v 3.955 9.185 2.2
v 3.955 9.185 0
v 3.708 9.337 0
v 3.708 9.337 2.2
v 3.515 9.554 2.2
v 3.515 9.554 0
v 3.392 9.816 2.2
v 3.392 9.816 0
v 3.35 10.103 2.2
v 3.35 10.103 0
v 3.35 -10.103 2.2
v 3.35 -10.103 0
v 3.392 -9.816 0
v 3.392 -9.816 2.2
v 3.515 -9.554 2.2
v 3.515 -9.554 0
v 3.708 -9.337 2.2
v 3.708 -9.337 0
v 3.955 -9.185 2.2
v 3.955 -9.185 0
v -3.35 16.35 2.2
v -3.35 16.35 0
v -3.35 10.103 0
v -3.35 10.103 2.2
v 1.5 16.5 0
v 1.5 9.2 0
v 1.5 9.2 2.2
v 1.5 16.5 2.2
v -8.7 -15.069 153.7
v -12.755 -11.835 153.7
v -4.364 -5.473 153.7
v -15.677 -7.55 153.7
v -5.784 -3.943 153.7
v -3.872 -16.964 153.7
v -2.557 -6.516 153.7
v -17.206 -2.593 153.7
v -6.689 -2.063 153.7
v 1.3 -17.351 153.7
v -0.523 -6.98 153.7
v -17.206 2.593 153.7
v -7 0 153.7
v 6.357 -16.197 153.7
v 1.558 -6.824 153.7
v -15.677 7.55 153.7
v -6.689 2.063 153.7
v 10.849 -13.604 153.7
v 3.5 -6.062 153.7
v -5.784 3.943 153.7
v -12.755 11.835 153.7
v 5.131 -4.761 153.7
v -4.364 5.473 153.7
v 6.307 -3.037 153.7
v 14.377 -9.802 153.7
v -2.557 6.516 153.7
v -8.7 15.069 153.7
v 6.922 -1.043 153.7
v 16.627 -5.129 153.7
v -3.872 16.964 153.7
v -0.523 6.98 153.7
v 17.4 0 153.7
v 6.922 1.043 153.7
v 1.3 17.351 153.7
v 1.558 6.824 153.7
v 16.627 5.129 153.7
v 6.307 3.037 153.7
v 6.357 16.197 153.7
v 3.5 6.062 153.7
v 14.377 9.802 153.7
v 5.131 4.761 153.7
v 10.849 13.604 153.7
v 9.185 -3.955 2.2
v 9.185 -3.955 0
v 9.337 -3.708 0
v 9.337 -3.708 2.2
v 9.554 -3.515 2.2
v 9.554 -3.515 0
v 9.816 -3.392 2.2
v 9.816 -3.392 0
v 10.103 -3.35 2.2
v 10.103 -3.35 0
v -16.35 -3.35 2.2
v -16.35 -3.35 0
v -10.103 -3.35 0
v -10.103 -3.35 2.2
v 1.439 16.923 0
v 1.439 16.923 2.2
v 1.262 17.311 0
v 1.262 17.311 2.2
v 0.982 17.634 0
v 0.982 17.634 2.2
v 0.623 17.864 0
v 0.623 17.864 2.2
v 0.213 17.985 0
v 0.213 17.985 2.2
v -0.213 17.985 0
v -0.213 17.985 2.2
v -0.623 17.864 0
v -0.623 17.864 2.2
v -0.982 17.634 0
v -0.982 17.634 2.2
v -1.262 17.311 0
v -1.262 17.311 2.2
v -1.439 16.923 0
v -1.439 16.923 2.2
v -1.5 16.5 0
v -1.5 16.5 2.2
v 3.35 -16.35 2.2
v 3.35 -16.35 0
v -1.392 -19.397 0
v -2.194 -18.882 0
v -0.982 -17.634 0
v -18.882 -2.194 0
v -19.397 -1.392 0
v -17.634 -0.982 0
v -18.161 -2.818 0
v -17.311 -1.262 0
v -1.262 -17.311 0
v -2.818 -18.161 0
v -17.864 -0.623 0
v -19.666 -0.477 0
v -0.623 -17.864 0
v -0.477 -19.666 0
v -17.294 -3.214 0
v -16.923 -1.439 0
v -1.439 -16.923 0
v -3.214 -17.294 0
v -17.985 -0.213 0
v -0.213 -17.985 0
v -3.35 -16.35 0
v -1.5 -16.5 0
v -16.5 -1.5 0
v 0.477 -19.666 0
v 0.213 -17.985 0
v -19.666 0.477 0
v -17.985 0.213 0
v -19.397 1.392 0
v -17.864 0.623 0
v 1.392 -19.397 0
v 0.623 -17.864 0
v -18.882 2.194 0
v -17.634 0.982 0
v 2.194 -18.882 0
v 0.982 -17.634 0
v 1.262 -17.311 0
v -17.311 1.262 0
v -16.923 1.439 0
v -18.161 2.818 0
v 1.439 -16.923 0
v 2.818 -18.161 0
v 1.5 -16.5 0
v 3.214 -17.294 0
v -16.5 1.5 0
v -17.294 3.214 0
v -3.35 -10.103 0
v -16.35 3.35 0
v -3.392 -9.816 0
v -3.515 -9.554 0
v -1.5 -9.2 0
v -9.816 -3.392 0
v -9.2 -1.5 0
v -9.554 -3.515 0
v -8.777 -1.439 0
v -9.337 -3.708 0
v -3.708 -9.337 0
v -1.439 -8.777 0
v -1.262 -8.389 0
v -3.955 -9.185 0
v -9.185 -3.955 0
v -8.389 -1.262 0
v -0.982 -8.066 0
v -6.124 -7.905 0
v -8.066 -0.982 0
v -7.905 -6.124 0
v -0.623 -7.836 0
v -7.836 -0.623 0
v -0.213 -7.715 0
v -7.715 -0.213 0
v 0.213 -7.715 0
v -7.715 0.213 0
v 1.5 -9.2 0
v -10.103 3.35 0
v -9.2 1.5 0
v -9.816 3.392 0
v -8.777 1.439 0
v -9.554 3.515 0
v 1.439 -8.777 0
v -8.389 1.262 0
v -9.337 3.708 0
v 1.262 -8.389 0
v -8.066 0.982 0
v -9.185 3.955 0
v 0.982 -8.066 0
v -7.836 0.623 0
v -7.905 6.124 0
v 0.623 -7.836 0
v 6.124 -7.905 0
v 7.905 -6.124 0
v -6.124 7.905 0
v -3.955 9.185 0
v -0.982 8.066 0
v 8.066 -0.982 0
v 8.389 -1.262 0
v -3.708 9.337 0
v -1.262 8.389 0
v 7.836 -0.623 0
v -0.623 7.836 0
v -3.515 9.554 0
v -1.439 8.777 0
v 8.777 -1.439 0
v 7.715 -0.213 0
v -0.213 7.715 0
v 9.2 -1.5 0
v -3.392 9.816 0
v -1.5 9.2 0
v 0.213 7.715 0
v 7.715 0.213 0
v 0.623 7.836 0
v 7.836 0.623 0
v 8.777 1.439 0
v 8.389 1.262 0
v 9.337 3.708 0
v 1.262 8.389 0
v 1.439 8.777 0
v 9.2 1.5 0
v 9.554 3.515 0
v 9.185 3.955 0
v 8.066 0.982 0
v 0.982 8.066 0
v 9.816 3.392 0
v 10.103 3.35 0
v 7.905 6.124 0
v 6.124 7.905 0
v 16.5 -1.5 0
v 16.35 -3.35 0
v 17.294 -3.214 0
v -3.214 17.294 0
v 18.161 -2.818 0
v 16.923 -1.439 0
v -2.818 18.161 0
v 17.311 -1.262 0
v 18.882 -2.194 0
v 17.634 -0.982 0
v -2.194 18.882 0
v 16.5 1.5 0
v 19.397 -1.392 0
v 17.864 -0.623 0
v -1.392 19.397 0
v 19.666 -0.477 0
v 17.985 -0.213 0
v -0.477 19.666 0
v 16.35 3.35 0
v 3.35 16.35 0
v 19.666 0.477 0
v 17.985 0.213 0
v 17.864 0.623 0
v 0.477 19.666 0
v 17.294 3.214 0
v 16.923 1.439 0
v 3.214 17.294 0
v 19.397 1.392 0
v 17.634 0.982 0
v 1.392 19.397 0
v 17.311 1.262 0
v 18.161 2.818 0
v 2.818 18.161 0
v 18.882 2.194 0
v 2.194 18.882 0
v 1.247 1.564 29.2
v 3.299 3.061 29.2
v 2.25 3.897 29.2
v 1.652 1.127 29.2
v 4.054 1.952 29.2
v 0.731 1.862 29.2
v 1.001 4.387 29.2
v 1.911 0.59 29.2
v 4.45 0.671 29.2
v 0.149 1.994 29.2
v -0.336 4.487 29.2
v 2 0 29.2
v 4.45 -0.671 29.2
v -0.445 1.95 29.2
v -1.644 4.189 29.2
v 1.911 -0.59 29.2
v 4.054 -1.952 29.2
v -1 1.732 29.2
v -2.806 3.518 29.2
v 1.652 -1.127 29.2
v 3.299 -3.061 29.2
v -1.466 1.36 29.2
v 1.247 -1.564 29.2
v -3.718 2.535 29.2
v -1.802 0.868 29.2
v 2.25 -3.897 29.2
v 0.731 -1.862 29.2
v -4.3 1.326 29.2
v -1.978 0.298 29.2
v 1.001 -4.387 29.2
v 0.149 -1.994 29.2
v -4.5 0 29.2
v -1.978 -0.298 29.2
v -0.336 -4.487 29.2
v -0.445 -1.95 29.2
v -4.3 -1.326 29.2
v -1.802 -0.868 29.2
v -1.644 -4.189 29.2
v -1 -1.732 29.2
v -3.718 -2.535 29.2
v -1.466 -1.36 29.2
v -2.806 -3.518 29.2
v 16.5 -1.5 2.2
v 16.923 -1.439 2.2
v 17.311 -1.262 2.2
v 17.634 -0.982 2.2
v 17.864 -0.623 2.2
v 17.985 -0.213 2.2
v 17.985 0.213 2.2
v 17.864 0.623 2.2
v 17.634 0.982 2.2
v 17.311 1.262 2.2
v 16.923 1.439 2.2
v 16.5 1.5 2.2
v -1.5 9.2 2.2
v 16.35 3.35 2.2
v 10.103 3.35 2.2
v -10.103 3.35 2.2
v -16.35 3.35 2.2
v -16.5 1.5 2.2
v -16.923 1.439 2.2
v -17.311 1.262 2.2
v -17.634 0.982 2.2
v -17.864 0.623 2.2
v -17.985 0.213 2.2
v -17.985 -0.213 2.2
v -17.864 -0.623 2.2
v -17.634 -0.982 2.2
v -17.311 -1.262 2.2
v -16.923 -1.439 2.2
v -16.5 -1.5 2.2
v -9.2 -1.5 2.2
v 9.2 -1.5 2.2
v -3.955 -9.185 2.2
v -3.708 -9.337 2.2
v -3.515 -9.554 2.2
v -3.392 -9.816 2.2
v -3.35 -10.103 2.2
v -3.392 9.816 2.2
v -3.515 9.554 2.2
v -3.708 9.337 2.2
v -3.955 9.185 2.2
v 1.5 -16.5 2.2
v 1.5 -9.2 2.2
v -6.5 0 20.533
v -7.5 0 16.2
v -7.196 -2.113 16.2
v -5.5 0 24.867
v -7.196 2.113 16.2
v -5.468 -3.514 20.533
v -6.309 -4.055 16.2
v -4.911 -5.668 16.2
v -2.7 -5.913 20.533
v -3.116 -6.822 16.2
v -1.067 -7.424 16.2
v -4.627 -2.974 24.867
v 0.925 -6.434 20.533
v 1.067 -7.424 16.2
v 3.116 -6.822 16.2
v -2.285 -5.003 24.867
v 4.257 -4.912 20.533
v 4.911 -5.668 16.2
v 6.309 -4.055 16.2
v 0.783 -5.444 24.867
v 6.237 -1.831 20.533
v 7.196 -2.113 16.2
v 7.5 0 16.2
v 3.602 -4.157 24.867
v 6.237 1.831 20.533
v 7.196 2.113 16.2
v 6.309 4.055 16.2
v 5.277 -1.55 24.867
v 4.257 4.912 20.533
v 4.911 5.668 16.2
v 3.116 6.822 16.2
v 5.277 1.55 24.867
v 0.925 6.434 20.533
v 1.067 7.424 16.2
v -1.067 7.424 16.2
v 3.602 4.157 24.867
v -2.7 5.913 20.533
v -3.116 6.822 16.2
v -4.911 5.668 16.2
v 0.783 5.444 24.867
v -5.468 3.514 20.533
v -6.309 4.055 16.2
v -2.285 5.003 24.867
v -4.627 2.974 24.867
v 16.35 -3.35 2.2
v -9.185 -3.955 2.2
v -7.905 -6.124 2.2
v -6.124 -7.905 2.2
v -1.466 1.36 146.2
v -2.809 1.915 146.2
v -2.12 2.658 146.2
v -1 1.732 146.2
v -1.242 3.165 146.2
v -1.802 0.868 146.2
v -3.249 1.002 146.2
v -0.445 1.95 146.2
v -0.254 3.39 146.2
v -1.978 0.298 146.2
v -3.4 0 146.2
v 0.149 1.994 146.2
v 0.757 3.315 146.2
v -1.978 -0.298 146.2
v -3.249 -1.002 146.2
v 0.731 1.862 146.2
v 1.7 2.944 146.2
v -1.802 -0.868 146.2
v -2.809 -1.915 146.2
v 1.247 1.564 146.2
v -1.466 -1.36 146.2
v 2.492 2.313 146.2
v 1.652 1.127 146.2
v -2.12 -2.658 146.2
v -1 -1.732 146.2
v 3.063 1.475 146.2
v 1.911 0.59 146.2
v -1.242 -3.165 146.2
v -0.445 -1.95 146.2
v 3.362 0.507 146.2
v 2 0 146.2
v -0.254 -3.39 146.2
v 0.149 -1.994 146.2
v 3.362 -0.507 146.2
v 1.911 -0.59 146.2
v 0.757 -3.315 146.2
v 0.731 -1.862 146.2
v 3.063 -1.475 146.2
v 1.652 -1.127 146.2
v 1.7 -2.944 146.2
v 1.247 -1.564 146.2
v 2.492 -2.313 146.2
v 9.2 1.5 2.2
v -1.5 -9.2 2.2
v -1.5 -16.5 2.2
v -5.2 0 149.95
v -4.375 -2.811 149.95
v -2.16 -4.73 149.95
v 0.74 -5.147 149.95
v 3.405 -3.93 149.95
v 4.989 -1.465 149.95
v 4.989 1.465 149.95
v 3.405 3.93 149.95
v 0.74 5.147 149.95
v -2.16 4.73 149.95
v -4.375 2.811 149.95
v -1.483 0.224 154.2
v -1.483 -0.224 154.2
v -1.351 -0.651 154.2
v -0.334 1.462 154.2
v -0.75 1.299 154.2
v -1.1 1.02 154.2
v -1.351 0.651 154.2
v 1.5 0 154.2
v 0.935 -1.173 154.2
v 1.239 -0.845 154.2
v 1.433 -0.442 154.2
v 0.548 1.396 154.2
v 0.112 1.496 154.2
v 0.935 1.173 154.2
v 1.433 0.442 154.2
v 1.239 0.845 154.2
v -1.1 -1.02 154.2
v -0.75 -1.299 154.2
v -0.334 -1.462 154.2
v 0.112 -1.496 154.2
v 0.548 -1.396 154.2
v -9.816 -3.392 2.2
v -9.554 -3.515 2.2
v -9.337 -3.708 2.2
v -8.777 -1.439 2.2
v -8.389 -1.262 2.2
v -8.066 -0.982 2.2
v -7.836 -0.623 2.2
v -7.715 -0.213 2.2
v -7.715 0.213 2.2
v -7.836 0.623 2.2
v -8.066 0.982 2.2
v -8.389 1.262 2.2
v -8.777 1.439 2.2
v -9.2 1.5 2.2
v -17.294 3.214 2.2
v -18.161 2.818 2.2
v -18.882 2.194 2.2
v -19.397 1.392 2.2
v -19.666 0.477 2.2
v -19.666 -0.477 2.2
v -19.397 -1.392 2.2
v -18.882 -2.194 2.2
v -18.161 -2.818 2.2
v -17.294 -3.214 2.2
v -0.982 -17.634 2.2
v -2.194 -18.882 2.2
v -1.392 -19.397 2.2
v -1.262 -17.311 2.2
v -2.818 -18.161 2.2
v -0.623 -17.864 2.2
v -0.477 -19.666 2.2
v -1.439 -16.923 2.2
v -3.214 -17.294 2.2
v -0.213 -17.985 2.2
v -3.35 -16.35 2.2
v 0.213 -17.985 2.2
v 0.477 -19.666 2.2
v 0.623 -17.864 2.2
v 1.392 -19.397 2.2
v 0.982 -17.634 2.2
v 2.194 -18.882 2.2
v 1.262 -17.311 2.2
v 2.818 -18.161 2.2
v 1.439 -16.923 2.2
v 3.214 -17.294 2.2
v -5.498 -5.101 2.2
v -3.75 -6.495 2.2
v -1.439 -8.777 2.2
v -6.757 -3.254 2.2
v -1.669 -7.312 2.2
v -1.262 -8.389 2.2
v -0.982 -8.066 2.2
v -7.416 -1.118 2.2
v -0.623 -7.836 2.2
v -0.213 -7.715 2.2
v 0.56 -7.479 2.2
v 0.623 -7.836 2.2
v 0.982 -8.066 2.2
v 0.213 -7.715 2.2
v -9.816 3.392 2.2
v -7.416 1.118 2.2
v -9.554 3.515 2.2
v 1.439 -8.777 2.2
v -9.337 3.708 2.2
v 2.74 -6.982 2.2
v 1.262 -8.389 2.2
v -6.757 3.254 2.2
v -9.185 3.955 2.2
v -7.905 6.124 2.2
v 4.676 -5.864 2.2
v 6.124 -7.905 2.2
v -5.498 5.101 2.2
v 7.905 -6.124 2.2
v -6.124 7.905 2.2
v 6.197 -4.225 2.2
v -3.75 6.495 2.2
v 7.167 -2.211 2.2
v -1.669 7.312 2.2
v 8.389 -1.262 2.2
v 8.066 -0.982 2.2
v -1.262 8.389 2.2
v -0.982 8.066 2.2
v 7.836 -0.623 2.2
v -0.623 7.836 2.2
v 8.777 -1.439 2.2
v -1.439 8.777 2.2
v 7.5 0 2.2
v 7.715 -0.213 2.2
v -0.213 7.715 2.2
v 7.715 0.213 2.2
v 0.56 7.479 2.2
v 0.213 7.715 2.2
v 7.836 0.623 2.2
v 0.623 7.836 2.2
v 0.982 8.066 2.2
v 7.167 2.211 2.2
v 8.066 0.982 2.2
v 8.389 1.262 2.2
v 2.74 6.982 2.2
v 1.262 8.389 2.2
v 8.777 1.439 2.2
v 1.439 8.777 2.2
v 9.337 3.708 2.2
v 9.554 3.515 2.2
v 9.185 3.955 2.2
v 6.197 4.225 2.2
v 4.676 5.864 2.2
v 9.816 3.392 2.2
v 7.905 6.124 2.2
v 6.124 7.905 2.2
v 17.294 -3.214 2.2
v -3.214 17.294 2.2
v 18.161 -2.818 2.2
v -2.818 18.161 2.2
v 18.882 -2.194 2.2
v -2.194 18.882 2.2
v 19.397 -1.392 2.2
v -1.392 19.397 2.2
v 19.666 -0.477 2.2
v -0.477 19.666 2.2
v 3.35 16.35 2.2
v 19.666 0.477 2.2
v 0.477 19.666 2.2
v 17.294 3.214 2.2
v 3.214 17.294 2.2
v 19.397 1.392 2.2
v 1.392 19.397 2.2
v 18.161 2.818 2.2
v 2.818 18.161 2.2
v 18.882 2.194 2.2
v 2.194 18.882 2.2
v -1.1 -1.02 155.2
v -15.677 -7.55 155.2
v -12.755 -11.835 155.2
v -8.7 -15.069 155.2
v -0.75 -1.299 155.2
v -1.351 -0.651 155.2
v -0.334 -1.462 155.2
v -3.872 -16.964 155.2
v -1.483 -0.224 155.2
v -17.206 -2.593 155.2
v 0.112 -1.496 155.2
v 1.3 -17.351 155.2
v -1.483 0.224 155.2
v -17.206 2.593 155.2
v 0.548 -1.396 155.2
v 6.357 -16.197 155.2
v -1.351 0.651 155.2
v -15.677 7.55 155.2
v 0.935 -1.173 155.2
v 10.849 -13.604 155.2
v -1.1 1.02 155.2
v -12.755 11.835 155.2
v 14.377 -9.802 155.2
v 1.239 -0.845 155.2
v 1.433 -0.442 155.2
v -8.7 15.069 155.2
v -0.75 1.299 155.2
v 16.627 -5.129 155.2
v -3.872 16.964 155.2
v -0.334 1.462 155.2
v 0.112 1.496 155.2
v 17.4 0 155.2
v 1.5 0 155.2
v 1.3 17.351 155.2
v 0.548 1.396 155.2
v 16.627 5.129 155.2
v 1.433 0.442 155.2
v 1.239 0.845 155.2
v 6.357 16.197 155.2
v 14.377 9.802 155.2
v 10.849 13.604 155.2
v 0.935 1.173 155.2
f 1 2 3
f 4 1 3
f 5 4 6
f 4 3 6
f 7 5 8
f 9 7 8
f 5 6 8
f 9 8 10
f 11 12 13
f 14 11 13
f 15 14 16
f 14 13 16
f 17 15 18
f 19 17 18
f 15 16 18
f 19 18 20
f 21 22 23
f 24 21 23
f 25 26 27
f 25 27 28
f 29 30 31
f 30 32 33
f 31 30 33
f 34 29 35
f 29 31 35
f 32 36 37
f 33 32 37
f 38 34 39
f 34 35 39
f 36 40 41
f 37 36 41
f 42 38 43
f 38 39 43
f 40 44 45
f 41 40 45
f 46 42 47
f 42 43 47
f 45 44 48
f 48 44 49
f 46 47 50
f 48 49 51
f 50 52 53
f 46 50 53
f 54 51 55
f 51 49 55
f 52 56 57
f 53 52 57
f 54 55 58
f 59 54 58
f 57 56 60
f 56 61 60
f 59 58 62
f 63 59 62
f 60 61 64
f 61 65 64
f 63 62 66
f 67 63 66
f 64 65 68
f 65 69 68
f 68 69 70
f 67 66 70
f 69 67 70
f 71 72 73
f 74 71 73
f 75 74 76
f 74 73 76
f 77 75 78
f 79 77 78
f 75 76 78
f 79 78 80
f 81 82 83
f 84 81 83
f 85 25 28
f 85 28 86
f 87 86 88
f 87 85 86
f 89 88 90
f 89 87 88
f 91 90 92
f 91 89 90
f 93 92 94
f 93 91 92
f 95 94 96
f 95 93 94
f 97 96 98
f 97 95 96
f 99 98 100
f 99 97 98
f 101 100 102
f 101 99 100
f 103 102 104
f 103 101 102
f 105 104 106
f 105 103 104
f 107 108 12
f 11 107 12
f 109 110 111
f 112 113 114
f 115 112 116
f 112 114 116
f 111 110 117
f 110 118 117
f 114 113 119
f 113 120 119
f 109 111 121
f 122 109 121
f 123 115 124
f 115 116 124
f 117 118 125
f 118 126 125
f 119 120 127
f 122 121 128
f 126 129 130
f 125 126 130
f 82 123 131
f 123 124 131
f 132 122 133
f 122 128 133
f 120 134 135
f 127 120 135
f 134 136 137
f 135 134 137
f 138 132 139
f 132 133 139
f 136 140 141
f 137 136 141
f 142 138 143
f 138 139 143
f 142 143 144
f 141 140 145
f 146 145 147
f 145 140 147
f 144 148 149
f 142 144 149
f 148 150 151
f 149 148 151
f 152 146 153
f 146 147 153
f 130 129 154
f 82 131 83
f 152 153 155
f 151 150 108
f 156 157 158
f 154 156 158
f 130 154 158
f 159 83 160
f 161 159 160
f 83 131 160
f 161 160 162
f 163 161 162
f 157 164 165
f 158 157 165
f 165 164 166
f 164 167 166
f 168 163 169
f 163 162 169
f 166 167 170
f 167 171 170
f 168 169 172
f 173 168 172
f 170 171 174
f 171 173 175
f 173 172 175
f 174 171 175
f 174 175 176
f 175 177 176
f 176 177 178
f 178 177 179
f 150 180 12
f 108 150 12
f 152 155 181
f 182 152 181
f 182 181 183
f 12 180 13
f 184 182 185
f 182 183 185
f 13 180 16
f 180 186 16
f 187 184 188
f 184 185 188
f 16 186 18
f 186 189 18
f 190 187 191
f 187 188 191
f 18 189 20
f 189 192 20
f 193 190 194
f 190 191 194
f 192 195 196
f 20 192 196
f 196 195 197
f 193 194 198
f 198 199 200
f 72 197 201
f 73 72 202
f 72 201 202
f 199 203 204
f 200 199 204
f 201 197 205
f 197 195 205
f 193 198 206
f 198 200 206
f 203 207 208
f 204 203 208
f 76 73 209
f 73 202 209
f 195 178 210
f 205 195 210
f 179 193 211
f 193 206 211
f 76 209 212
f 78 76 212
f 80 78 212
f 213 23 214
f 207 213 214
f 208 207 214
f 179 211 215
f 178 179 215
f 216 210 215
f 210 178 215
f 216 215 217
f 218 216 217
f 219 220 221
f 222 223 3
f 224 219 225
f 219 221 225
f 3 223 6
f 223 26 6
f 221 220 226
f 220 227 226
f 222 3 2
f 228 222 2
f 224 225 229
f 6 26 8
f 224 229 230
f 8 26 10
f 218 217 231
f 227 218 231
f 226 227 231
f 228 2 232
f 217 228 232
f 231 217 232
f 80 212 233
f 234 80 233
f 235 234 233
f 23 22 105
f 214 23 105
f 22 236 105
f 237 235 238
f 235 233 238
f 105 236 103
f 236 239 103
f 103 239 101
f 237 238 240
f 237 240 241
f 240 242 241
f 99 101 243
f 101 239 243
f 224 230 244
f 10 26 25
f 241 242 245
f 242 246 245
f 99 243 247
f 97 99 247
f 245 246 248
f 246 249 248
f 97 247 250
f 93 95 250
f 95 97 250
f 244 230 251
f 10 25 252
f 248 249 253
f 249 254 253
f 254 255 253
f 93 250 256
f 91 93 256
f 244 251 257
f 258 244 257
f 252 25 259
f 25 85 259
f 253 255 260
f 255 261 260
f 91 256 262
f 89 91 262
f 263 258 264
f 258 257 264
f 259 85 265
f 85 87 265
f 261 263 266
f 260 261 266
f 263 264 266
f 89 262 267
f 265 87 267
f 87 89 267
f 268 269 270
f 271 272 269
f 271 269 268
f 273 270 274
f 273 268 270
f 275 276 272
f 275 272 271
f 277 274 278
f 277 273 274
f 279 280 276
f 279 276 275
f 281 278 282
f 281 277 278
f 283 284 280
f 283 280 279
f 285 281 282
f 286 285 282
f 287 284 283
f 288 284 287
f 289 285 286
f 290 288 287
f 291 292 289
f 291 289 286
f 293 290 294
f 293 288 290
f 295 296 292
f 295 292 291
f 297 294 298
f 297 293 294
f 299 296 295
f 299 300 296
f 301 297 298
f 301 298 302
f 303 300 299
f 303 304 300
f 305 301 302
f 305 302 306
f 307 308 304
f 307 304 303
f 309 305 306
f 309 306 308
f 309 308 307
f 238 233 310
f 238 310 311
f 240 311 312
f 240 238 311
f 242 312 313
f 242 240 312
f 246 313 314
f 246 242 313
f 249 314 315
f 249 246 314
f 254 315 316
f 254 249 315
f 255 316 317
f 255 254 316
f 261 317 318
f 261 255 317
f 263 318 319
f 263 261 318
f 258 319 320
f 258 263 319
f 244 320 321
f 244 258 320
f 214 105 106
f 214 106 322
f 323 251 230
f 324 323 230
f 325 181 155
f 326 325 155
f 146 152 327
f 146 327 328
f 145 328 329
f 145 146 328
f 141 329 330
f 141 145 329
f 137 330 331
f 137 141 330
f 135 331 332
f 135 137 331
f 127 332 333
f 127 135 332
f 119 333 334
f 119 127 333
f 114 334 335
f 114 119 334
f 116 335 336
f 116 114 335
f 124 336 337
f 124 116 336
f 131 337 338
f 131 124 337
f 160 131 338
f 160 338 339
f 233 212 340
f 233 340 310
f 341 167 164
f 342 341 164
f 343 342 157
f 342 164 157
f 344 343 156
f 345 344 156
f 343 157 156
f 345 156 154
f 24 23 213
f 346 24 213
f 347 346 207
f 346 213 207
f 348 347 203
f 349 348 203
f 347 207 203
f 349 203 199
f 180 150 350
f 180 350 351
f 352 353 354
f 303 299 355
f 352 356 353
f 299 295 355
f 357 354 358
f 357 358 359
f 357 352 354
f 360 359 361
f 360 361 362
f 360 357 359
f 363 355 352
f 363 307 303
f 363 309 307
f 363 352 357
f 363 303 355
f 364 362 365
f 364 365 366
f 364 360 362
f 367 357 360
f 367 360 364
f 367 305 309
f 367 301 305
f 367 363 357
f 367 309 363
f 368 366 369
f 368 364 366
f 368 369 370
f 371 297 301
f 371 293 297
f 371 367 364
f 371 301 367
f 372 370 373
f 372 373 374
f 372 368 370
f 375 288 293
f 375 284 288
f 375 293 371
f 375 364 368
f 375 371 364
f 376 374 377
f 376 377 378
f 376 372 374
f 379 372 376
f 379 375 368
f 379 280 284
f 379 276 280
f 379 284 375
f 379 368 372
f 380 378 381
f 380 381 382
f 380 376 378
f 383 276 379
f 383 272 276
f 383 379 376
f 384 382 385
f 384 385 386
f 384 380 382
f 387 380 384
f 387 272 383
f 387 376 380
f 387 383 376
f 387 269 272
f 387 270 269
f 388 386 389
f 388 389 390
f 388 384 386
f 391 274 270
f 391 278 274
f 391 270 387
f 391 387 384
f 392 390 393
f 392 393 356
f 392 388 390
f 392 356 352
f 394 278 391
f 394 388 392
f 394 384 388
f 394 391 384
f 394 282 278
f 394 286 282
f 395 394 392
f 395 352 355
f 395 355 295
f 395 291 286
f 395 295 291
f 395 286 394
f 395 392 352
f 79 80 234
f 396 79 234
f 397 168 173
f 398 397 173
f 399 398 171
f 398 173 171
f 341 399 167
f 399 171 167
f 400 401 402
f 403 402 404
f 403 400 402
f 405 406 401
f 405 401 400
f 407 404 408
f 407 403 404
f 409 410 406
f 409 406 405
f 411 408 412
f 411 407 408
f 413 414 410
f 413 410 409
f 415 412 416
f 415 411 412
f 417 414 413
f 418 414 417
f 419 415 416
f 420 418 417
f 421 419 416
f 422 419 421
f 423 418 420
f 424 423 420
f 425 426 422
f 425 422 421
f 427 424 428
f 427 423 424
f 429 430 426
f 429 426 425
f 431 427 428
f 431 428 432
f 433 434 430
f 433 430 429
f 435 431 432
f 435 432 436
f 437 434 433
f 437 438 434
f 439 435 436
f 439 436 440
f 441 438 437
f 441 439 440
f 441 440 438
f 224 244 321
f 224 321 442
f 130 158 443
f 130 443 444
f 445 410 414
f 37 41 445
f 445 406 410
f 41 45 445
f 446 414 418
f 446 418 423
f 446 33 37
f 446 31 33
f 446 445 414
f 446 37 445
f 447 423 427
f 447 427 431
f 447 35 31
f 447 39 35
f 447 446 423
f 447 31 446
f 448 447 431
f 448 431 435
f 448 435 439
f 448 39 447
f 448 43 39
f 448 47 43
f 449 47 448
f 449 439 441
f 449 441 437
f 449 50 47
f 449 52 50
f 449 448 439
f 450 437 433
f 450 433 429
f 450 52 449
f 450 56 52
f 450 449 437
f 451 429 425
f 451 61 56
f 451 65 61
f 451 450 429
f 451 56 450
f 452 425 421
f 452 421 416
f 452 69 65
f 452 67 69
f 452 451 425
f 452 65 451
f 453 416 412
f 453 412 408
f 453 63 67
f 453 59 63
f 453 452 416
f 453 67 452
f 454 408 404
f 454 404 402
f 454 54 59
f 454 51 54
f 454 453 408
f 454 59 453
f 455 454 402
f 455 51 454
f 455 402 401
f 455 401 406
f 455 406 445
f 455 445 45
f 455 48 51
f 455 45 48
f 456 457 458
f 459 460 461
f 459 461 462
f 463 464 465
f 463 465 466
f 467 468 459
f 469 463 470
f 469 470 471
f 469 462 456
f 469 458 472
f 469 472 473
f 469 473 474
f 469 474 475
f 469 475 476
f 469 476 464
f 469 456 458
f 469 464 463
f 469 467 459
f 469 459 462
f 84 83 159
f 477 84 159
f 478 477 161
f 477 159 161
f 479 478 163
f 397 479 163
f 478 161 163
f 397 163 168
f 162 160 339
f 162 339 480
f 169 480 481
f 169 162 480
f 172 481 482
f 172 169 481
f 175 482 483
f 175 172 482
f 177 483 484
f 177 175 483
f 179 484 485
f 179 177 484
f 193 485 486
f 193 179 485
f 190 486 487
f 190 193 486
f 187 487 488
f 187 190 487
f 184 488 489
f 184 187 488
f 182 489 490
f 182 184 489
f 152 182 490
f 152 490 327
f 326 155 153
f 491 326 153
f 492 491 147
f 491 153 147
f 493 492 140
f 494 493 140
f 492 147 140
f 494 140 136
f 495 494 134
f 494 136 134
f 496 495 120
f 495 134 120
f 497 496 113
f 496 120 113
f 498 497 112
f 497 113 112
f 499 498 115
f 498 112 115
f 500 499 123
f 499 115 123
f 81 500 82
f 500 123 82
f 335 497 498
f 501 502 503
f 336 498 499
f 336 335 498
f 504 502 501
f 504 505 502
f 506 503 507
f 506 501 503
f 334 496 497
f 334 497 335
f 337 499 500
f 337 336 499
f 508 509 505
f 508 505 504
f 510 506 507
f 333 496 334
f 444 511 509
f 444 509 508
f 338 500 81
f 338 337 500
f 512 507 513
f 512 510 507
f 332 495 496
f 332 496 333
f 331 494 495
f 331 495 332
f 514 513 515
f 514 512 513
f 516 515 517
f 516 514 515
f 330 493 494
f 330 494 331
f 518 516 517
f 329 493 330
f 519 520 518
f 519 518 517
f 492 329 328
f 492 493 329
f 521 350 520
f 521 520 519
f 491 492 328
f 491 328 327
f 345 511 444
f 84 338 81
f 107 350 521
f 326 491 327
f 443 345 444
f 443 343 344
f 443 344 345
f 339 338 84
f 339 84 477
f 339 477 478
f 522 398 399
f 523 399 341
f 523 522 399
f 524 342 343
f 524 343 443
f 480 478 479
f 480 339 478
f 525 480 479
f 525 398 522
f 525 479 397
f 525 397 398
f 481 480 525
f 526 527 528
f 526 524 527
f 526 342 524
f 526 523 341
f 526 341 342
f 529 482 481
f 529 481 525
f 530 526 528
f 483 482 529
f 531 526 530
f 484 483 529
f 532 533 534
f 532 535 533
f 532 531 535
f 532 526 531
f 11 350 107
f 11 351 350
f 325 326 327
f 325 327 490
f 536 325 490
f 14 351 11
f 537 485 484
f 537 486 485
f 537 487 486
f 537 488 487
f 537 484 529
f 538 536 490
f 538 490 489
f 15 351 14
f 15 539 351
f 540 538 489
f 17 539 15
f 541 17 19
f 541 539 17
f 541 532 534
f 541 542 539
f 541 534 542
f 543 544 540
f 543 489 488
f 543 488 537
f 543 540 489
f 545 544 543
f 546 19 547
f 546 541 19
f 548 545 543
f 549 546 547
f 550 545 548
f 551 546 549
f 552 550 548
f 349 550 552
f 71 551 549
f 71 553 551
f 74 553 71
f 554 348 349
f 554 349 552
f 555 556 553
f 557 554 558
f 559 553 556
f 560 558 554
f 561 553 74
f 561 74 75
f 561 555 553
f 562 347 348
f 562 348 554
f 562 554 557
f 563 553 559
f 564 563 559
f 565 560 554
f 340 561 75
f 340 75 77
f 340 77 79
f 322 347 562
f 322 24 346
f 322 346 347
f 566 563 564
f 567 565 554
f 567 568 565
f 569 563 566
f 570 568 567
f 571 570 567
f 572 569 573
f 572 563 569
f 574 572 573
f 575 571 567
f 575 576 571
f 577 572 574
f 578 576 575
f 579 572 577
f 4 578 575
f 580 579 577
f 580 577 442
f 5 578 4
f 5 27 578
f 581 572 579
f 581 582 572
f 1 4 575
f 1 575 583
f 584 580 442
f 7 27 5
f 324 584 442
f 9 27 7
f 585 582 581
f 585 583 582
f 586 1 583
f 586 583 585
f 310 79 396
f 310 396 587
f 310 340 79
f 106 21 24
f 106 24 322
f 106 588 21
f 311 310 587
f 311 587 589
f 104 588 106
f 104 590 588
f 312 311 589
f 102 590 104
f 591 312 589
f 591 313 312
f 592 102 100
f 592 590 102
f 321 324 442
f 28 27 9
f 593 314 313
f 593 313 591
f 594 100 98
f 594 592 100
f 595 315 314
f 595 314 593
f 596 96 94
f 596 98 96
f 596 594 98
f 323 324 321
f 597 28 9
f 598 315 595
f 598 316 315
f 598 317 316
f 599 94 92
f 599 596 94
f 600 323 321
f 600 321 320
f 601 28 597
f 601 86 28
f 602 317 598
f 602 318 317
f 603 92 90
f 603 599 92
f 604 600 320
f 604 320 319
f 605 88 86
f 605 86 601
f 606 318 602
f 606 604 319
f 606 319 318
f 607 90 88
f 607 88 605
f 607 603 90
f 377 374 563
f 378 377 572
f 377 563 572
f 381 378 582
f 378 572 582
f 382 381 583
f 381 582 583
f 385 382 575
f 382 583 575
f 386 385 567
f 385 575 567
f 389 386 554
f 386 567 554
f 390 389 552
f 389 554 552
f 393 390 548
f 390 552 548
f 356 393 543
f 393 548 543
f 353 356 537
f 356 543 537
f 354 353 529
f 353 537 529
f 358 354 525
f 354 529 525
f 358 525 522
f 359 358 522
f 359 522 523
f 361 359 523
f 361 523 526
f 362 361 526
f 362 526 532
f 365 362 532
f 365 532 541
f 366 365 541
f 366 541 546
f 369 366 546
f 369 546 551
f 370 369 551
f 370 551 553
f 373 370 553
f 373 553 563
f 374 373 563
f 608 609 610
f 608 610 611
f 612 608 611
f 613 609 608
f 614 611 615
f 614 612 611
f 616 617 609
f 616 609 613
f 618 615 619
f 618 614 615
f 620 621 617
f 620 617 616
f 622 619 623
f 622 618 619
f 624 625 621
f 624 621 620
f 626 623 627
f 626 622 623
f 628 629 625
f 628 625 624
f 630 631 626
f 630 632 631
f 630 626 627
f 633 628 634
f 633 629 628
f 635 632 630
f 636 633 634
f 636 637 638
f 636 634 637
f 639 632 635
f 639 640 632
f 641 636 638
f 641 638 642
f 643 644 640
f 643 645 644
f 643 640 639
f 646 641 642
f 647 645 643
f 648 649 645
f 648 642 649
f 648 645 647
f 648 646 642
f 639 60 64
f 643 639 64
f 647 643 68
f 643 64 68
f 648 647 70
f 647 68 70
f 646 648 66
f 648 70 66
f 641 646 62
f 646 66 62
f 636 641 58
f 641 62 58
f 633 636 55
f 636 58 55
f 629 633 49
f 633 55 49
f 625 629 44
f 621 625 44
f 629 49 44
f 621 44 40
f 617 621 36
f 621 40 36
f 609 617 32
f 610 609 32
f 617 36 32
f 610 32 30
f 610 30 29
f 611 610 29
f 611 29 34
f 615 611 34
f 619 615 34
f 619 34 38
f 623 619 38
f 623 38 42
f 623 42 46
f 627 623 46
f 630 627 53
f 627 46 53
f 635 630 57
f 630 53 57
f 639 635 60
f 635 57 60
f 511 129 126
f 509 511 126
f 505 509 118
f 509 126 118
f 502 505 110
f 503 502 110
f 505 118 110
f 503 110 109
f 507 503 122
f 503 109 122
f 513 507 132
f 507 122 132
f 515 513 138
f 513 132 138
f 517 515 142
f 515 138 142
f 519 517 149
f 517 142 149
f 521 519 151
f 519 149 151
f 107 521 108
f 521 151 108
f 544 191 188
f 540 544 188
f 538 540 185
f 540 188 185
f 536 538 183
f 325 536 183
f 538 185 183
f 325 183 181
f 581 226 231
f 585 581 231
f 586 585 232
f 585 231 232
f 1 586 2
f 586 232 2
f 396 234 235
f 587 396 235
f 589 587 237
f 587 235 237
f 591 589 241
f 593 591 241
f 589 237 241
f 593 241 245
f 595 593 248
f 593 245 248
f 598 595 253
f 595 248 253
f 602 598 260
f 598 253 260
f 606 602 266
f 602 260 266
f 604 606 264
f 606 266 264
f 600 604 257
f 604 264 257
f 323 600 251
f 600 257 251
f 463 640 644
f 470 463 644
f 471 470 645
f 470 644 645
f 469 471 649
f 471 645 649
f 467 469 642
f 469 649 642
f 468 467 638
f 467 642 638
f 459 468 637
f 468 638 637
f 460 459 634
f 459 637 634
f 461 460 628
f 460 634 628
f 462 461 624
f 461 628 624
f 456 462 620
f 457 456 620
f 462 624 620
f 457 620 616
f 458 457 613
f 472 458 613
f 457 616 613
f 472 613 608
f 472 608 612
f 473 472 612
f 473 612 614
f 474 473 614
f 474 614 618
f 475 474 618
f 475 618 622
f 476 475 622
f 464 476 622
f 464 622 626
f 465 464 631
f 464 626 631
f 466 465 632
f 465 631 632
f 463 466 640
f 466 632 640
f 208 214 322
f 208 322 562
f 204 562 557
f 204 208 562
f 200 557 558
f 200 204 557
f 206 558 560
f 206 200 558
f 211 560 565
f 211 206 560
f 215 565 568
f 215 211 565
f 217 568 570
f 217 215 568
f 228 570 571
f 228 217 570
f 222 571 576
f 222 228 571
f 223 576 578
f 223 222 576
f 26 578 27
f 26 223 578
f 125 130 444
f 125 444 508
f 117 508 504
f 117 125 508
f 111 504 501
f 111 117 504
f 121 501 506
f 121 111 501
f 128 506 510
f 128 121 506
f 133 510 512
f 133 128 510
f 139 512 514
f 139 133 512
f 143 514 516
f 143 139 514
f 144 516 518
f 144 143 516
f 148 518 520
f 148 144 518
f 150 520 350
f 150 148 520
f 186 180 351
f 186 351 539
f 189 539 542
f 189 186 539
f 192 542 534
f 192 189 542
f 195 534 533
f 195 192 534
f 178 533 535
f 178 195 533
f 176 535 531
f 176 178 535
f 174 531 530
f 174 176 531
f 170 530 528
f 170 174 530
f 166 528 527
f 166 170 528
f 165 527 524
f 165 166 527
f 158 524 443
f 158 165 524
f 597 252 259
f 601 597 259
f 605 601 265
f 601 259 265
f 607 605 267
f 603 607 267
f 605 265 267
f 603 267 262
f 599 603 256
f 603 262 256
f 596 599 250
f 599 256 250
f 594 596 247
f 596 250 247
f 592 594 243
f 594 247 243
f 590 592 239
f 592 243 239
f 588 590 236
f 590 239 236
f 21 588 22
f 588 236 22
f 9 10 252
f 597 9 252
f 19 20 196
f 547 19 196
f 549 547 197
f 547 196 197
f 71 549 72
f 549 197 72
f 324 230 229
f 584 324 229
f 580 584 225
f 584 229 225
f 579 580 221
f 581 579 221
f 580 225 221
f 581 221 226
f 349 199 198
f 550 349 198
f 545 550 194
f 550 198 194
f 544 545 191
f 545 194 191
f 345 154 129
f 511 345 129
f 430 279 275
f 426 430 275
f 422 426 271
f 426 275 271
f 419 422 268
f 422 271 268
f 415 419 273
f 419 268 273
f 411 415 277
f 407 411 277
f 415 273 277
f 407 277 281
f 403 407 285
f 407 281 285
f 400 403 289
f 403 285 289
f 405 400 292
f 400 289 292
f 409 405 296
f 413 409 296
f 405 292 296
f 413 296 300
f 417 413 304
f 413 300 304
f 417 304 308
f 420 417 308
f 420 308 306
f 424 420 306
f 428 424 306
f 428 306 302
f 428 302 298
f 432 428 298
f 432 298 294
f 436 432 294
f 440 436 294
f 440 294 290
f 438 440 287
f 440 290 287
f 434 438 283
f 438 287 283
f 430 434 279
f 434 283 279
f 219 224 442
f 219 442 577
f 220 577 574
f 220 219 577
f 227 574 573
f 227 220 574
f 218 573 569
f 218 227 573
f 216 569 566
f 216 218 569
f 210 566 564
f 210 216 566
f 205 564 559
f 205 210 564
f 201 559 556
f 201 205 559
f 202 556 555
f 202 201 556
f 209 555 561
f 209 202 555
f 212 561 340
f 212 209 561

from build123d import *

# Parameters (mm, degrees)
BOSS_EXTRUDE1_DEPTH = 2.2
SKETCH2_R           = 7.5
BOSS_EXTRUDE2_DEPTH = 14
SKETCH4_R           = 2
BOSS_EXTRUDE3_DEPTH = 117
SKETCH6_R           = 17.4
BOSS_EXTRUDE4_DEPTH = 1.5
SKETCH7_R           = 1.5
CUT_EXTRUDE1_DEPTH  = 1


with BuildPart() as part:
    # Sketch1 → Boss-Extrude1 (new body)
    with BuildSketch(Plane.XY):
        with BuildLine():
            Line((-3.35, 16.35), (-3.35, 10.103341032))
            ThreePointArc((-3.35, 10.103341032), (-3.514699292, 9.553547682), (-3.954545455, 9.184855483))
            ThreePointArc((-3.954545455, 9.184855483), (-7.071067812, 7.071067812), (-9.184855483, 3.954545455))
            ThreePointArc((-9.184855483, 3.954545455), (-9.553547682, 3.514699292), (-10.103341032, 3.35))
            Line((-10.103341032, 3.35), (-16.35, 3.35))
            ThreePointArc((-16.35, 3.35), (-19.7, 0), (-16.35, -3.35))
            Line((-16.35, -3.35), (-10.103341032, -3.35))
            ThreePointArc((-10.103341032, -3.35), (-9.553547682, -3.514699292), (-9.184855483, -3.954545455))
            ThreePointArc((-9.184855483, -3.954545455), (-7.071067812, -7.071067812), (-3.954545455, -9.184855483))
            ThreePointArc((-3.954545455, -9.184855483), (-3.514699292, -9.553547682), (-3.35, -10.103341032))
            Line((-3.35, -10.103341032), (-3.35, -16.35))
            ThreePointArc((-3.35, -16.35), (0, -19.7), (3.35, -16.35))
            Line((3.35, -16.35), (3.35, -10.103341032))
            ThreePointArc((3.35, -10.103341032), (3.514699292, -9.553547682), (3.954545455, -9.184855483))
            ThreePointArc((3.954545455, -9.184855483), (7.071067812, -7.071067812), (9.184855483, -3.954545455))
            ThreePointArc((9.184855483, -3.954545455), (9.553547682, -3.514699292), (10.103341032, -3.35))
            Line((10.103341032, -3.35), (16.35, -3.35))
            ThreePointArc((16.35, -3.35), (19.7, 0), (16.35, 3.35))
            Line((16.35, 3.35), (10.103341032, 3.35))
            ThreePointArc((10.103341032, 3.35), (9.553547682, 3.514699292), (9.184855483, 3.954545455))
            ThreePointArc((9.184855483, 3.954545455), (7.071067812, 7.071067812), (3.954545455, 9.184855483))
            ThreePointArc((3.954545455, 9.184855483), (3.514699292, 9.553547682), (3.35, 10.103341032))
            Line((3.35, 10.103341032), (3.35, 16.35))
            ThreePointArc((3.35, 16.35), (0, 19.7), (-3.35, 16.35))
        make_face()
        with BuildLine():
            Line((16.5, 1.5), (9.2, 1.5))
            ThreePointArc((9.2, 1.5), (7.7, 0), (9.2, -1.5))
            Line((9.2, -1.5), (16.5, -1.5))
            ThreePointArc((16.5, -1.5), (18, 0), (16.5, 1.5))
        make_face(mode=Mode.SUBTRACT)
        with BuildLine():
            Line((-1.5, -9.2), (-1.5, -16.5))
            ThreePointArc((-1.5, -16.5), (0, -18), (1.5, -16.5))
            Line((1.5, -16.5), (1.5, -9.2))
            ThreePointArc((1.5, -9.2), (0, -7.7), (-1.5, -9.2))
        make_face(mode=Mode.SUBTRACT)
        with BuildLine():
            Line((-9.2, 1.5), (-16.5, 1.5))
            ThreePointArc((-16.5, 1.5), (-18, 0), (-16.5, -1.5))
            Line((-16.5, -1.5), (-9.2, -1.5))
            ThreePointArc((-9.2, -1.5), (-7.7, 0), (-9.2, 1.5))
        make_face(mode=Mode.SUBTRACT)
        with BuildLine():
            Line((1.5, 9.2), (1.5, 16.5))
            ThreePointArc((1.5, 16.5), (0, 18), (-1.5, 16.5))
            Line((-1.5, 16.5), (-1.5, 9.2))
            ThreePointArc((-1.5, 9.2), (0, 7.7), (1.5, 9.2))
        make_face(mode=Mode.SUBTRACT)
    extrude(amount=BOSS_EXTRUDE1_DEPTH)

    # Sketch2 → Boss-Extrude2 (add)
    with BuildSketch(Plane.XY.offset(2.2)):
        Circle(SKETCH2_R)
    extrude(amount=BOSS_EXTRUDE2_DEPTH)

    # Sketch3 → Revolve1 (revolve)
    with BuildSketch(Plane(origin=(0, 0, 0), x_dir=(1, 0, 0), z_dir=(0, 1, 0)), mode=Mode.PRIVATE) as revolve1_sk:
        Polygon((0, -16.2), (7.5, -16.2), (4.5, -29.2), (0, -29.2), align=None)
    revolve(revolve1_sk.sketch.rotate(Axis((0, 0, 16.2), (0, 0, 1)), 180), axis=Axis((0, 0, 16.2), (0, 0, 1)))

    # Sketch4 → Boss-Extrude3 (add)
    with BuildSketch(Plane.XY.offset(29.2)):
        Circle(SKETCH4_R)
    extrude(amount=BOSS_EXTRUDE3_DEPTH)

    # Sketch5 → Revolve2 (revolve)
    with BuildSketch(Plane(origin=(0, 0, 0), x_dir=(1, 0, 0), z_dir=(0, 1, 0)), mode=Mode.PRIVATE) as revolve2_sk:
        Polygon((0, -146.2), (3.4, -146.2), (7, -153.7), (0, -153.7), align=None)
    revolve(revolve2_sk.sketch.rotate(Axis((0, 0, 146.2), (0, 0, 1)), 180), axis=Axis((0, 0, 146.2), (0, 0, 1)))

    # Sketch6 → Boss-Extrude4 (add)
    with BuildSketch(Plane.XY.offset(153.7)):
        Circle(SKETCH6_R)
    extrude(amount=BOSS_EXTRUDE4_DEPTH)

    # Sketch7 → Cut-Extrude1 (cut)
    with BuildSketch(Plane.XY.offset(155.2)):
        Circle(SKETCH7_R)
    extrude(amount=-CUT_EXTRUDE1_DEPTH, mode=Mode.SUBTRACT)


solid = part.part
